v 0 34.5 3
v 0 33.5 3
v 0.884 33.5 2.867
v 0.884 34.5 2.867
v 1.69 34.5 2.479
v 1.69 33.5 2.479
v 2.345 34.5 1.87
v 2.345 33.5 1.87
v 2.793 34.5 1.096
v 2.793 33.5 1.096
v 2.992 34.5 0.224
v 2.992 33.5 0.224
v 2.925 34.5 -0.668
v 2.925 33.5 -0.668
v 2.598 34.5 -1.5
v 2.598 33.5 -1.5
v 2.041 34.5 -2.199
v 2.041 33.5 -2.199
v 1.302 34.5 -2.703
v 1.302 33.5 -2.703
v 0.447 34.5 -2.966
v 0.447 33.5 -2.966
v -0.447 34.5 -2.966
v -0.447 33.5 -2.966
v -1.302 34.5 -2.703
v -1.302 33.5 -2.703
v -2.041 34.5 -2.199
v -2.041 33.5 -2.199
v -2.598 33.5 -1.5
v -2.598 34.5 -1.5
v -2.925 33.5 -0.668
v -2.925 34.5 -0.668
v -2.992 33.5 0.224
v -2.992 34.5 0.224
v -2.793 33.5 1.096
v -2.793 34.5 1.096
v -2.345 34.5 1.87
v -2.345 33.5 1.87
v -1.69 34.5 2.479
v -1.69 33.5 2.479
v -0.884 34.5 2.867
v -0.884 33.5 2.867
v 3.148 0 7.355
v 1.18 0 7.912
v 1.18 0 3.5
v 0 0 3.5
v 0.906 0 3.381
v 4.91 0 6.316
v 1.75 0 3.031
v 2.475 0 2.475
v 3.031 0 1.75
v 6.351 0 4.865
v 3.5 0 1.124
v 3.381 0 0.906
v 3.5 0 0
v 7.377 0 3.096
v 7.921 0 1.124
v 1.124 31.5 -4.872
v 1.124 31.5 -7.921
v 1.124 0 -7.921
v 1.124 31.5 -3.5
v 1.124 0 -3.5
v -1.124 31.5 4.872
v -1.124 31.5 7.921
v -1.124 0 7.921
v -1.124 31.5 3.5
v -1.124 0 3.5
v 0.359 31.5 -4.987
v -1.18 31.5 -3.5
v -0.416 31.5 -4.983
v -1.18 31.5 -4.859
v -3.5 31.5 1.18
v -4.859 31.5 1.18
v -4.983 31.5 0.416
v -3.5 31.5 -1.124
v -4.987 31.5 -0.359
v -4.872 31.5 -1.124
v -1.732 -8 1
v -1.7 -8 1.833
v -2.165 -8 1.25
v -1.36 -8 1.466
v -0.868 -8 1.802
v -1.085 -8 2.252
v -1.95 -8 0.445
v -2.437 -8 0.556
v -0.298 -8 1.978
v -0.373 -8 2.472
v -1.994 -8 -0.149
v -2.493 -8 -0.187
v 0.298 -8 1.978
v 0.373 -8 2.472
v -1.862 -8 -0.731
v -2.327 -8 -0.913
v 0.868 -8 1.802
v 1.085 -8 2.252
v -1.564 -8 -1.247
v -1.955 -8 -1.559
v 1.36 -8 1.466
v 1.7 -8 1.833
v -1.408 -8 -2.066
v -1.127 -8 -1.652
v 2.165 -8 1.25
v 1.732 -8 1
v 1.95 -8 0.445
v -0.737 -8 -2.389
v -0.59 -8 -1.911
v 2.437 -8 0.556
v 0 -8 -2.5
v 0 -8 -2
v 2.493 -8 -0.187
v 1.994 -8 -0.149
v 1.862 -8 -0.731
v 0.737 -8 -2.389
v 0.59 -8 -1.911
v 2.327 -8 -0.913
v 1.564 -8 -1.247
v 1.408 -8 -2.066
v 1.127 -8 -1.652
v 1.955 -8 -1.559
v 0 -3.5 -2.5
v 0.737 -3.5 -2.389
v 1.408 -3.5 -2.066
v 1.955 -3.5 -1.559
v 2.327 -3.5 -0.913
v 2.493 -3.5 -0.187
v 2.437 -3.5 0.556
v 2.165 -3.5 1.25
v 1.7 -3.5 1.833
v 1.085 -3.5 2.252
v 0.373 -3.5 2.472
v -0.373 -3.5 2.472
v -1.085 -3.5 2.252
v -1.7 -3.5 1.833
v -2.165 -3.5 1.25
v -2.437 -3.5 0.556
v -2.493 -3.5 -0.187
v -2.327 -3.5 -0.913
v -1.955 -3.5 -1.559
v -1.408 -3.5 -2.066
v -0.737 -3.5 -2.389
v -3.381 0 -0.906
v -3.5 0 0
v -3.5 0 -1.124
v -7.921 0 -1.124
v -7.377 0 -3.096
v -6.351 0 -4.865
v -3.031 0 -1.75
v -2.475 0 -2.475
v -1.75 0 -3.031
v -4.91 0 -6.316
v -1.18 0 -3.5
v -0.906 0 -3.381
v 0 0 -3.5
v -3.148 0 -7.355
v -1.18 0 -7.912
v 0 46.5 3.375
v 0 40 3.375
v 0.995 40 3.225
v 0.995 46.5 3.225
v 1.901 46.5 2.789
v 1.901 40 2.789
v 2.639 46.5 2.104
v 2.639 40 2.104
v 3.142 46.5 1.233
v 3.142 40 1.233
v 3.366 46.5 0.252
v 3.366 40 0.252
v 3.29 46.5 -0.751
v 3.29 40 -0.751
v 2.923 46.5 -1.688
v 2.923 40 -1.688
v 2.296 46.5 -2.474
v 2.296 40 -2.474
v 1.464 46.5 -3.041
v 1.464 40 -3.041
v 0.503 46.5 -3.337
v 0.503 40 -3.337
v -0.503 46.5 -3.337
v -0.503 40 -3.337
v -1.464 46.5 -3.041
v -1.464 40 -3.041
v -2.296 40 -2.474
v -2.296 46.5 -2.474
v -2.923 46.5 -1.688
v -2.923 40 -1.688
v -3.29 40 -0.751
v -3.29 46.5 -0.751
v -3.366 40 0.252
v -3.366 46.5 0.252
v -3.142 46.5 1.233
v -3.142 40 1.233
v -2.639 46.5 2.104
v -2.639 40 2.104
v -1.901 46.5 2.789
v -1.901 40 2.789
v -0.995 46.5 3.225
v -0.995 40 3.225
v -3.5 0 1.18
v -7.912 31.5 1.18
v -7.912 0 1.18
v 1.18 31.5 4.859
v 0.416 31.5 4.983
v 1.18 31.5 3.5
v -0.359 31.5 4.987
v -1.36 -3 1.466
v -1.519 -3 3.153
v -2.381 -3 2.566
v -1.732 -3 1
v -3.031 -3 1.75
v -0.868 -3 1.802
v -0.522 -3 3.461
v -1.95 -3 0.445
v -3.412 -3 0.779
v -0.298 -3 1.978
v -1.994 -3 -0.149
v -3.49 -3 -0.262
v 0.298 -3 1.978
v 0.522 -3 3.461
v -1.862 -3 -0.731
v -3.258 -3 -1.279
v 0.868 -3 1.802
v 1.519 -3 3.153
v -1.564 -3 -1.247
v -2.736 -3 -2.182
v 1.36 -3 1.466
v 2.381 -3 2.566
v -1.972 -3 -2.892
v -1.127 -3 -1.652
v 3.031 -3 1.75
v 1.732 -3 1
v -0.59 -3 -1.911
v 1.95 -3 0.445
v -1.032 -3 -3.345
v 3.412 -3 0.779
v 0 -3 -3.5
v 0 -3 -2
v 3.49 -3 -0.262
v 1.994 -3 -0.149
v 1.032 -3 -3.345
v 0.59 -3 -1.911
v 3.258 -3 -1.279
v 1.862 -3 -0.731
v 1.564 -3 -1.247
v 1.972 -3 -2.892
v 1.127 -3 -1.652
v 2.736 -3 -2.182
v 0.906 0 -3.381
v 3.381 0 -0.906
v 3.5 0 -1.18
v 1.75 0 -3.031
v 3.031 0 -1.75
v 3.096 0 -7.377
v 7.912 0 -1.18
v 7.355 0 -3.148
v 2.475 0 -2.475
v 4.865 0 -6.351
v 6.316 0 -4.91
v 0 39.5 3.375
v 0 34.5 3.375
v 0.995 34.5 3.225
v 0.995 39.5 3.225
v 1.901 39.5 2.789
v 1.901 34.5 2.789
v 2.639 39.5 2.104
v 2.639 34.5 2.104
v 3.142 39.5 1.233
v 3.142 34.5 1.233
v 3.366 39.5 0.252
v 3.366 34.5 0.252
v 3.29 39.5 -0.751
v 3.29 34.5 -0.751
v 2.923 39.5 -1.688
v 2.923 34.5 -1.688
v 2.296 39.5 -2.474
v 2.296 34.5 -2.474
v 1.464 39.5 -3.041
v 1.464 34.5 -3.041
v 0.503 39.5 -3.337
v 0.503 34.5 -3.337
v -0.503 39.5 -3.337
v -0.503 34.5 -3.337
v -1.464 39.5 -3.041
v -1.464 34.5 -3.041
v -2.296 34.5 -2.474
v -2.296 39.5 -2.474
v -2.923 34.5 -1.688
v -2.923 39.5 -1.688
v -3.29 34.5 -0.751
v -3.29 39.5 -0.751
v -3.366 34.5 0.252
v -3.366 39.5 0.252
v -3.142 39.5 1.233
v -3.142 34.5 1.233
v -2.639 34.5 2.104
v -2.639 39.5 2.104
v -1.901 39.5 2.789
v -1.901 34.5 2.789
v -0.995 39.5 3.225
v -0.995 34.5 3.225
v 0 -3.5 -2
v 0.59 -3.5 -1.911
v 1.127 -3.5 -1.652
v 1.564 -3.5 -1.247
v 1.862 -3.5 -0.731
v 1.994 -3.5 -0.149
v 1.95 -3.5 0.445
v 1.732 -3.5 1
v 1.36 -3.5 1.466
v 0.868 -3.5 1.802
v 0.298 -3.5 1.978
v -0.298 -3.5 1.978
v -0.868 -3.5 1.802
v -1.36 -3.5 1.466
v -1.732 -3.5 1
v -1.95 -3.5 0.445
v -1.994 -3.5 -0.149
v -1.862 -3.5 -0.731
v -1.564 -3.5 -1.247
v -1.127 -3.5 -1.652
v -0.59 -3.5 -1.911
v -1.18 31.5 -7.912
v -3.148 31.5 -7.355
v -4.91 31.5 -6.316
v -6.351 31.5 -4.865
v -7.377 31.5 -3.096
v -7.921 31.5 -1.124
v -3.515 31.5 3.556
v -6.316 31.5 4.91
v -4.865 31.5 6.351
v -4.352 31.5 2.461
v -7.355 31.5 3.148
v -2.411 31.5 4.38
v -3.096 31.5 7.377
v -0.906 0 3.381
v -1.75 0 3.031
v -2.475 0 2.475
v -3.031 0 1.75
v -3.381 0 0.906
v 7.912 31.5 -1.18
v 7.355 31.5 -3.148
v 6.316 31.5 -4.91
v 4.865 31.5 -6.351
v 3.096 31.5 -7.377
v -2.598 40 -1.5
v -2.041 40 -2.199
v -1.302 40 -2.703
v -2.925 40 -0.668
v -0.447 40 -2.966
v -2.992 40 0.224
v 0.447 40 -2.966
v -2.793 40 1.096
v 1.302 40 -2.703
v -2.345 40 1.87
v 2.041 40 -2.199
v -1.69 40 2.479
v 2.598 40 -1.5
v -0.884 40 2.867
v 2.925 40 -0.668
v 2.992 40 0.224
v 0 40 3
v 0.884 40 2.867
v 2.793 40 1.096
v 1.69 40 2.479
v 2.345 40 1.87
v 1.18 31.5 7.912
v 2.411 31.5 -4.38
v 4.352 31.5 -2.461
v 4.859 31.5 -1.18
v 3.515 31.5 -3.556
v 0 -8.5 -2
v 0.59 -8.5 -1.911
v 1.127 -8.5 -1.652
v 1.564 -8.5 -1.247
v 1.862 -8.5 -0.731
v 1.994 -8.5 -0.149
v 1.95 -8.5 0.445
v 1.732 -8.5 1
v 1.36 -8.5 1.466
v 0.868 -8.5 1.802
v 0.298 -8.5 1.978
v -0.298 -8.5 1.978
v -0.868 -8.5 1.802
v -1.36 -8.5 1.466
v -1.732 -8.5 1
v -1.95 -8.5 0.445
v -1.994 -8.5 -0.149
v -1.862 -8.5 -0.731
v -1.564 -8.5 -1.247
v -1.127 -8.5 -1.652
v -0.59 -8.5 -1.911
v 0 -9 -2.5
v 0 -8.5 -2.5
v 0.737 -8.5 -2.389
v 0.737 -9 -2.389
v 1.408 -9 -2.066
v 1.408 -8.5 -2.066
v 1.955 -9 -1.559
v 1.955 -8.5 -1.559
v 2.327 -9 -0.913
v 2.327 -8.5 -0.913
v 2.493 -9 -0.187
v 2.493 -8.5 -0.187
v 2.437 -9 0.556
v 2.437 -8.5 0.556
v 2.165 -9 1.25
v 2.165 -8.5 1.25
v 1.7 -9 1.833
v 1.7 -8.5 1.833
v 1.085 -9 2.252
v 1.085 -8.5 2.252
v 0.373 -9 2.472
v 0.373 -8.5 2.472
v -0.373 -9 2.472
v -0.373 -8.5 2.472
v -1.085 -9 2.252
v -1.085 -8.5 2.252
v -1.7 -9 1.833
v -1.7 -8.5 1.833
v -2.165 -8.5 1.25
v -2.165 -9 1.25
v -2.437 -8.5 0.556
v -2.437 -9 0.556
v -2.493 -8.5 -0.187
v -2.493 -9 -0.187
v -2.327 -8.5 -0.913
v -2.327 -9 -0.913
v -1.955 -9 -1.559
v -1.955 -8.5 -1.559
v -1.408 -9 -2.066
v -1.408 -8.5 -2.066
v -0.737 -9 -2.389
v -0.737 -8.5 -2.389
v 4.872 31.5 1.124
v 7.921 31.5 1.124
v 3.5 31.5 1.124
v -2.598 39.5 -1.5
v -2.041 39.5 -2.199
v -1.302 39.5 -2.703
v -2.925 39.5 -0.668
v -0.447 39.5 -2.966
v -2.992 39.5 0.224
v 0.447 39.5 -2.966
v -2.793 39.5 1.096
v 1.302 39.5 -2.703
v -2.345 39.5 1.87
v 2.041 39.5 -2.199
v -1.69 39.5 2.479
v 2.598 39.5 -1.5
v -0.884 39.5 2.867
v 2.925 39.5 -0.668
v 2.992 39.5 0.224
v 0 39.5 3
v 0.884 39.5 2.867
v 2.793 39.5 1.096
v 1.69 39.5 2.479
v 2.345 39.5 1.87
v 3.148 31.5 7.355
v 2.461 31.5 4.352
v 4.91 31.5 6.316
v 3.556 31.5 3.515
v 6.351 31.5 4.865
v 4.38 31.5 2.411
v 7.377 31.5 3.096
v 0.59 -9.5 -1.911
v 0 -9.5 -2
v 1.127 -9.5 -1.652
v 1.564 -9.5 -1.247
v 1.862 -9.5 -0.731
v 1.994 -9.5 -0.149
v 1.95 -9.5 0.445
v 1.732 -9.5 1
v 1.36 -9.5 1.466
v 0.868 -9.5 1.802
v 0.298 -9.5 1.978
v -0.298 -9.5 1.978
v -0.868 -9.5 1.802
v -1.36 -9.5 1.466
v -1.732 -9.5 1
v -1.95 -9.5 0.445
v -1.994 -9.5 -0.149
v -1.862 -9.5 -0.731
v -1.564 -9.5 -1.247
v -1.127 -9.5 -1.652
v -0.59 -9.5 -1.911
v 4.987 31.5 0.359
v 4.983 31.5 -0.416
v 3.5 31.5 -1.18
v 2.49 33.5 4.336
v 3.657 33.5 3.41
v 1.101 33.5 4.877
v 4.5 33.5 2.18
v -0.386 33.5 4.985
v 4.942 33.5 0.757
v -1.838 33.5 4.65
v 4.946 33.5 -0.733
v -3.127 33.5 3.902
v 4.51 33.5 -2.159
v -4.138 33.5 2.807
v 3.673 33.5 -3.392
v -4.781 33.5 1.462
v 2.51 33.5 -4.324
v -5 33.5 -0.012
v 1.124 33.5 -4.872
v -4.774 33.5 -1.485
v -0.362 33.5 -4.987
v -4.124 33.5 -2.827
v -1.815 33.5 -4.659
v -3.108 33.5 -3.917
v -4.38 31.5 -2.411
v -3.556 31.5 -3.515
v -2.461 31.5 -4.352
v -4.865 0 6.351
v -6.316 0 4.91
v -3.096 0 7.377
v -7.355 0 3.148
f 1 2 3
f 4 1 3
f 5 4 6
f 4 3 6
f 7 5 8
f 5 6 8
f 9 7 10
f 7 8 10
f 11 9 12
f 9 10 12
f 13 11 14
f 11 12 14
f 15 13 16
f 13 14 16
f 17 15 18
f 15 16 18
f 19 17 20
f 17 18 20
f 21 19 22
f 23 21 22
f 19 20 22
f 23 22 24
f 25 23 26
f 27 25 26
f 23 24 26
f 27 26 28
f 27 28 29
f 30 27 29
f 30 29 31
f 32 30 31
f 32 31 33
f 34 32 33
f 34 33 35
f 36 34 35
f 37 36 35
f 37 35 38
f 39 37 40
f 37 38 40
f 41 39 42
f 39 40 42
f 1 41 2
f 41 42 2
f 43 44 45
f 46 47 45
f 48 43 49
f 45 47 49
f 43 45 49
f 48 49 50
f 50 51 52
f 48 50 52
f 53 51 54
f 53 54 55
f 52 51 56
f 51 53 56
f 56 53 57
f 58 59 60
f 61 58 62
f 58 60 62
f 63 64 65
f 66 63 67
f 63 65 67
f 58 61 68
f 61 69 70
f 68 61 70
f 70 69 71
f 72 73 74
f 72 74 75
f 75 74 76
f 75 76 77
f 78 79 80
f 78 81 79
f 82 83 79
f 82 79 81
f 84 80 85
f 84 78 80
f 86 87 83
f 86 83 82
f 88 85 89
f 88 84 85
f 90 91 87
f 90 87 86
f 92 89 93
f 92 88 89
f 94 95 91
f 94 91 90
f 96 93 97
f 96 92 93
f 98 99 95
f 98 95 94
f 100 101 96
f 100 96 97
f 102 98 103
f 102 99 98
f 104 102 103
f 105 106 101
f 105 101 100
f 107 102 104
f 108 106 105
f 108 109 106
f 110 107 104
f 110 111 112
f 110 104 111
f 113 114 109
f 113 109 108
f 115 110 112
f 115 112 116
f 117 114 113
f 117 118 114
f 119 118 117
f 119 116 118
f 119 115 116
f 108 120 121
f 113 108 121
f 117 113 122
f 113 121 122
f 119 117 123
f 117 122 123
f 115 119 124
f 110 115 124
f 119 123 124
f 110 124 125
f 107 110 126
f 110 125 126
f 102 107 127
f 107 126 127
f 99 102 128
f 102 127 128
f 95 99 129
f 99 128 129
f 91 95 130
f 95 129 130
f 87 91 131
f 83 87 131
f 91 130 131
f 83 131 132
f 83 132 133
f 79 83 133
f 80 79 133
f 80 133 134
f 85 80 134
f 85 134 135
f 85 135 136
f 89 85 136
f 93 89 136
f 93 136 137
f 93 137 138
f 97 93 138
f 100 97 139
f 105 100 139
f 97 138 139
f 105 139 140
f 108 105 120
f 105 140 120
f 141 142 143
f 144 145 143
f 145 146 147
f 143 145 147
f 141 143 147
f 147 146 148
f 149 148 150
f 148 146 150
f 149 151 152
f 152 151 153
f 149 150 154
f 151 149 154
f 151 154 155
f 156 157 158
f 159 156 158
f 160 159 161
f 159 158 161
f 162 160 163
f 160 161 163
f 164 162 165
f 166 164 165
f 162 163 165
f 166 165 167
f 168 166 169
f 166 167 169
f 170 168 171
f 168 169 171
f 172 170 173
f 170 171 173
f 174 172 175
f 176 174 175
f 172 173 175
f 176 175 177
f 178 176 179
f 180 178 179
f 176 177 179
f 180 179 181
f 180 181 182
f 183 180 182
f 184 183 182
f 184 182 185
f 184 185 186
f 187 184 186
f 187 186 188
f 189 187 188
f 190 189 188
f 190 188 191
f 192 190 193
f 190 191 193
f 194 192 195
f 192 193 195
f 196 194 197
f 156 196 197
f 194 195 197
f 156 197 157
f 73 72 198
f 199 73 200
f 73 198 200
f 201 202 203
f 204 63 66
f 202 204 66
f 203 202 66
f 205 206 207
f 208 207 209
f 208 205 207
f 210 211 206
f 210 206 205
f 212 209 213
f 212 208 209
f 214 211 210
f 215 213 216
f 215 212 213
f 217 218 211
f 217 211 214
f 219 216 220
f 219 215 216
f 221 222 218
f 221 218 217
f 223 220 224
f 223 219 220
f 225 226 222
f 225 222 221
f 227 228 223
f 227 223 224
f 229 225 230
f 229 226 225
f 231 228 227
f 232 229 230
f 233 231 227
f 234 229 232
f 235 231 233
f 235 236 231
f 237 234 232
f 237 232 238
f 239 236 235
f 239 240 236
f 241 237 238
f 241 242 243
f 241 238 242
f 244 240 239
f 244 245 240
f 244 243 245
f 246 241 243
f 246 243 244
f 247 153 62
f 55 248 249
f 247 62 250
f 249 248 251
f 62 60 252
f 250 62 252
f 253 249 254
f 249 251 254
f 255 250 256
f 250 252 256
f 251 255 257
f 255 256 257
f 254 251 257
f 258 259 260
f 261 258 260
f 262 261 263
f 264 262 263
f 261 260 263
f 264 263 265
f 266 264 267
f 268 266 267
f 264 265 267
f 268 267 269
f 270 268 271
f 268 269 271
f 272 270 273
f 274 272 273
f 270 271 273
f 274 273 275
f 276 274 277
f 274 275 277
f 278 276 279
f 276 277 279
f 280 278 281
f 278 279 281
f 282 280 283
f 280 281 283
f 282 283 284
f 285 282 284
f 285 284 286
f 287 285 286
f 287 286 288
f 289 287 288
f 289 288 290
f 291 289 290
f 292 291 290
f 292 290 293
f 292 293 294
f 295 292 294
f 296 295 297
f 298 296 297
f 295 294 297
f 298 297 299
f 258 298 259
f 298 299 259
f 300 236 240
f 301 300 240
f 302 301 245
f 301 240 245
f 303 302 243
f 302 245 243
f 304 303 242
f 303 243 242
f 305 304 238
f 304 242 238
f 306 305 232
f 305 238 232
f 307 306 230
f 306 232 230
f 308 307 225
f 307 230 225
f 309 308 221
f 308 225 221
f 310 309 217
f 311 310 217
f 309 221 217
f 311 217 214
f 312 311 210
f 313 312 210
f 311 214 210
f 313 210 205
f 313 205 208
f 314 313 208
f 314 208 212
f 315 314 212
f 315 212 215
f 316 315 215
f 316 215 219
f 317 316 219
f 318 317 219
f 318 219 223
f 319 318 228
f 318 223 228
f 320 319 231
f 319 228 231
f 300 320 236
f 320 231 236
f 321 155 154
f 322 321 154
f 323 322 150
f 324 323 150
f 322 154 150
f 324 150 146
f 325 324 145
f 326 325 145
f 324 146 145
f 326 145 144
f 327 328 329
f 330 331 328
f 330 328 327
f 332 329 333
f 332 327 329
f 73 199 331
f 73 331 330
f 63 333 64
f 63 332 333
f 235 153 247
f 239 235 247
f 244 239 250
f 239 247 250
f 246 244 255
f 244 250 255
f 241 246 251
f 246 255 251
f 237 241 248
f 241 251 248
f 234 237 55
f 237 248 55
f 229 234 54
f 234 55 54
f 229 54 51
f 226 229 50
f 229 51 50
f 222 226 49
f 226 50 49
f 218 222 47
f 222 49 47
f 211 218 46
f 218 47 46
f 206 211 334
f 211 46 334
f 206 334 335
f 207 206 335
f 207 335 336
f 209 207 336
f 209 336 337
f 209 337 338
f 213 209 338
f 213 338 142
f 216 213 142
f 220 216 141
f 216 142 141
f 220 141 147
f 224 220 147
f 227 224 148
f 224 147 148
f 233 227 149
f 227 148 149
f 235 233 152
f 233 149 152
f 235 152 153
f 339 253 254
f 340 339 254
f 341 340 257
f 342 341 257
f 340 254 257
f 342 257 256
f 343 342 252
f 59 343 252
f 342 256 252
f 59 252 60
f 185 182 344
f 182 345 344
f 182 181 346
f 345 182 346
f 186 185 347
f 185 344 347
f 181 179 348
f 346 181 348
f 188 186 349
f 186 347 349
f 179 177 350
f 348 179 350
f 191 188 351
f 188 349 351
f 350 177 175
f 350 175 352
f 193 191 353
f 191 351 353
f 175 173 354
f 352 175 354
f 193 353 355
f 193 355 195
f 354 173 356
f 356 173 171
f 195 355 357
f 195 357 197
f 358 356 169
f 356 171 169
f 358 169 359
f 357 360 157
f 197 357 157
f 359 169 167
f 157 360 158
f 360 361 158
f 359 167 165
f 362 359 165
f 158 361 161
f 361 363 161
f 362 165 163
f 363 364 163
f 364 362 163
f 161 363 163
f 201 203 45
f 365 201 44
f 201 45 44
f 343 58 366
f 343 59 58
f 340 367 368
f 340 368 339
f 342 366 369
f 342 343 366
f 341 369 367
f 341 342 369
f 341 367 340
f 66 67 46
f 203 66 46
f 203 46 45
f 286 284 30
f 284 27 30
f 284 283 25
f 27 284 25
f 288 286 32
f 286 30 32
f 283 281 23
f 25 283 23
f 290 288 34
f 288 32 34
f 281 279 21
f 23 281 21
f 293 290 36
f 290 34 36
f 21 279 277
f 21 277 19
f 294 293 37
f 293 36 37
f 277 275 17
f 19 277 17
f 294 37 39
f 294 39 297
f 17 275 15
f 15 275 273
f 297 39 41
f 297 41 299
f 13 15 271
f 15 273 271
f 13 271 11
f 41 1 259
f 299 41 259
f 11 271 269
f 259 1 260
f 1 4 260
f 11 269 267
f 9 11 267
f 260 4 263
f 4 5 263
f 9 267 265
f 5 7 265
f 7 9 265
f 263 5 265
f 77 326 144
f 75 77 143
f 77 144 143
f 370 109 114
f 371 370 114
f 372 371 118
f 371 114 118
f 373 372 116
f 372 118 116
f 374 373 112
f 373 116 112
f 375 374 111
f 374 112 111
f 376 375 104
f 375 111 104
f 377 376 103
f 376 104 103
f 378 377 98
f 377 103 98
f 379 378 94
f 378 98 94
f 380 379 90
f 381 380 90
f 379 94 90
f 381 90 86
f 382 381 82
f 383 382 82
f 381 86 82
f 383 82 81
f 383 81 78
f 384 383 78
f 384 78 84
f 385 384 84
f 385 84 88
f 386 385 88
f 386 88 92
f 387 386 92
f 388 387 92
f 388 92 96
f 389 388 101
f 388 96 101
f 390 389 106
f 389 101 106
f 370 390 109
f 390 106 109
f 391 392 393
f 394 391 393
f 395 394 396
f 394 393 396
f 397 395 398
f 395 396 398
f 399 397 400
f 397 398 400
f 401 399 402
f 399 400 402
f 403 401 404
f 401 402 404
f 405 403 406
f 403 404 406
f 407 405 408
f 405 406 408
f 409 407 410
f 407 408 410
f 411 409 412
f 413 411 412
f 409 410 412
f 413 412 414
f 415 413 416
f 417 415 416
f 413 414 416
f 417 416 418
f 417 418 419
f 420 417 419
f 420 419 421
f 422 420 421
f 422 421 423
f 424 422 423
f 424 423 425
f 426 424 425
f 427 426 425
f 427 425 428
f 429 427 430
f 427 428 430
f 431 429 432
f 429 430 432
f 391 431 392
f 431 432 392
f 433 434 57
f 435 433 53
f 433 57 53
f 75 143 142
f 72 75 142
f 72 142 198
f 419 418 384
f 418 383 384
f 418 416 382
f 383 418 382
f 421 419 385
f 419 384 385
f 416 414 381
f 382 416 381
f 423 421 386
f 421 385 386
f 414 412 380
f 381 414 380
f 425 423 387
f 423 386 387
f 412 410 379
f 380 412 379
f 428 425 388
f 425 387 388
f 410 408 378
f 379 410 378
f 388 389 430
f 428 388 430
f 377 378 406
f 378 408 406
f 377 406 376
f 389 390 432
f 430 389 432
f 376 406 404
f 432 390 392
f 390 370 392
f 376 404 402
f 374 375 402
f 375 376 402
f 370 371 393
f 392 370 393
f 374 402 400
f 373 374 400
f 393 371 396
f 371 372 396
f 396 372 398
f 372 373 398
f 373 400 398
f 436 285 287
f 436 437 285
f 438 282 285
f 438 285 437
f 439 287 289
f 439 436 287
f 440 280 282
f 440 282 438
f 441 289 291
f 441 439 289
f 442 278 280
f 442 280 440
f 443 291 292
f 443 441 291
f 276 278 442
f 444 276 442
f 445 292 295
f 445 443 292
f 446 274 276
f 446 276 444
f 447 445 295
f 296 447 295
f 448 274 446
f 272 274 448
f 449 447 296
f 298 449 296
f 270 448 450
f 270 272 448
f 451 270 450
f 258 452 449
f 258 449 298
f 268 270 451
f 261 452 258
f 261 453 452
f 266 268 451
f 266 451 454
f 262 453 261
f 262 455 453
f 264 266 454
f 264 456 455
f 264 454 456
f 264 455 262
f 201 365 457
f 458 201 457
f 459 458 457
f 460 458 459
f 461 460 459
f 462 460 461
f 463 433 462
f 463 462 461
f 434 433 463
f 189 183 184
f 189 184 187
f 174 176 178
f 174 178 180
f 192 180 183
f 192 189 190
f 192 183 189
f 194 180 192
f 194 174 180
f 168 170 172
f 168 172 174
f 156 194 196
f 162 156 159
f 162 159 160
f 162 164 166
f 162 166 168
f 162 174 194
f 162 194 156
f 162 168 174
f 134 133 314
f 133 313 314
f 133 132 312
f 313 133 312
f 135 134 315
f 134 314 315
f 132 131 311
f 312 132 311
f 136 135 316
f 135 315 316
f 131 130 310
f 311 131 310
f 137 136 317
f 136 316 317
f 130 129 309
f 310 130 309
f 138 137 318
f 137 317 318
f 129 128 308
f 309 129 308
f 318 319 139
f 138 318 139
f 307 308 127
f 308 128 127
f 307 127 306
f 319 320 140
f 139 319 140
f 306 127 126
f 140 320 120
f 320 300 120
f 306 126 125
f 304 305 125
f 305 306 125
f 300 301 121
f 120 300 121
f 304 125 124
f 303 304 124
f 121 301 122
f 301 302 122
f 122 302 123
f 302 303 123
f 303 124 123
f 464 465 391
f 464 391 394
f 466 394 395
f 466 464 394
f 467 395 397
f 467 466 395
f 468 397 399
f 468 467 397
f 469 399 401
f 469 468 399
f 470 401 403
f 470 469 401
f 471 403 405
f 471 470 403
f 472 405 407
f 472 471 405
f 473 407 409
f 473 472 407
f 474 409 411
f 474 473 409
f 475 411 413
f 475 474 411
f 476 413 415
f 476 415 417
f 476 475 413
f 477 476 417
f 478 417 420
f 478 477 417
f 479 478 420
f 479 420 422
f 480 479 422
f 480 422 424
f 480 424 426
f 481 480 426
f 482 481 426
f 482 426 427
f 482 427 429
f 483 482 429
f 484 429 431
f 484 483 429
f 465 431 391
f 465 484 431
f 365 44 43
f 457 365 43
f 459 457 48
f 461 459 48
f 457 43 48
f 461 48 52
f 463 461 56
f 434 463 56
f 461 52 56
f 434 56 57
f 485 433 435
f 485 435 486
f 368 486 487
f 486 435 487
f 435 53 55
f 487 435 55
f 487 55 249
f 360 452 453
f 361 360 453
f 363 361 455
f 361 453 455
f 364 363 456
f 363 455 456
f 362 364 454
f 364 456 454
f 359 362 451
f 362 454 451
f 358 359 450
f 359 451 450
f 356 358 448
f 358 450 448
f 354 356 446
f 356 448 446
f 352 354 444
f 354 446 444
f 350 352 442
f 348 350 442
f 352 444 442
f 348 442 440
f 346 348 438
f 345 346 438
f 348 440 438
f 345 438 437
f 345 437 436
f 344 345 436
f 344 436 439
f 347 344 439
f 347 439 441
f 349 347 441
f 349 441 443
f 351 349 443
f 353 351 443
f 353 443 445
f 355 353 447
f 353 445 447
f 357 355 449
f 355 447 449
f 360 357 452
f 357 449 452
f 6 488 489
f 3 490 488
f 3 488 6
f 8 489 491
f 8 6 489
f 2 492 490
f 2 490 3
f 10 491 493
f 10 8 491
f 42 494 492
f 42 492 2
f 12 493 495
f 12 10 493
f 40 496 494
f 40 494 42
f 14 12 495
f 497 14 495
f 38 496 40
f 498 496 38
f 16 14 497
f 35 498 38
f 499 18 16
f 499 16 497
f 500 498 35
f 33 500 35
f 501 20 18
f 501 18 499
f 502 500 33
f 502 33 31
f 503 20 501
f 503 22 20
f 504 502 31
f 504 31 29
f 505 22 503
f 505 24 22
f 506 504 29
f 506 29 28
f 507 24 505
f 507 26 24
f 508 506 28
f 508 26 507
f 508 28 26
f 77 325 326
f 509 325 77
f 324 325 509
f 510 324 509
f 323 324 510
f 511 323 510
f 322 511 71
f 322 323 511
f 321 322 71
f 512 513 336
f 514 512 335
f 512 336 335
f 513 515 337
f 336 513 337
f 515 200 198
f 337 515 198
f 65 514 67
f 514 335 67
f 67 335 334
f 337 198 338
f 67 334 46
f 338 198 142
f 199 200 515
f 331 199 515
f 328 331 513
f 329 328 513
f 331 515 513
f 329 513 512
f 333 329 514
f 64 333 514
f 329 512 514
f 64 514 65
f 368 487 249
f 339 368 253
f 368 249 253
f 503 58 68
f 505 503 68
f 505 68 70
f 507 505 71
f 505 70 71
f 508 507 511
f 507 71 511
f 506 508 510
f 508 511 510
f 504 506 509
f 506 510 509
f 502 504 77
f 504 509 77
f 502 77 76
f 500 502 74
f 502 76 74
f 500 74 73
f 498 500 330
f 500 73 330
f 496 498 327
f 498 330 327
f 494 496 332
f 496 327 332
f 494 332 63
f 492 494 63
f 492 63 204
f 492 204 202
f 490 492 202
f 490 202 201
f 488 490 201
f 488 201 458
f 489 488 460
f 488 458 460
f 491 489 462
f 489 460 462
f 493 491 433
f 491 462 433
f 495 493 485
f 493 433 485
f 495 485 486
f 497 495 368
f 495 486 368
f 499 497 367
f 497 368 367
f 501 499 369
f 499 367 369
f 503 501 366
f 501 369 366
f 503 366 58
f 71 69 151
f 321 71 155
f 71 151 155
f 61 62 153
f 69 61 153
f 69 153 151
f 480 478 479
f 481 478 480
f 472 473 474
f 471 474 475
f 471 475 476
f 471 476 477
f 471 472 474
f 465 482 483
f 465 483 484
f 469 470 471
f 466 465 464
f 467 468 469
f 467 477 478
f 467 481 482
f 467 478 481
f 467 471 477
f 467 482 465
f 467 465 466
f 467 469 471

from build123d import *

# Parameters (mm, degrees)
BOSS_EXTRU_1_DEPTH  = 31.5
ESQUISSE3_R         = 3.5
BOSS_EXTRU_2_DEPTH  = 3
ESQUISSE5_R         = 2
BOSS_EXTRU_3_DEPTH  = 0.5
ESQUISSE6_R         = 2.5
BOSS_EXTRU_4_DEPTH  = 4.5
ESQUISSE8_R         = 2
BOSS_EXTRU_5_DEPTH  = 0.5
ESQUISSE9_R         = 2.5
BOSS_EXTRU_6_DEPTH  = 1
CHANFREIN1_SIZE     = 0.5
ESQUISSE10_R        = 5
BOSS_EXTRU_7_DEPTH  = 2
ESQUISSE11_R        = 3
BOSS_EXTRU_8_DEPTH  = 1
ESQUISSE13_R        = 3.375
BOSS_EXTRU_9_DEPTH  = 5
ESQUISSE15_R        = 3
BOSS_EXTRU_10_DEPTH = 0.5
ESQUISSE16_R        = 3.375
BOSS_EXTRU_11_DEPTH = 6.5


with BuildPart() as part:
    # Esquisse1 → Boss.-Extru.1 (new body)
    with BuildSketch(Plane(origin=(0, 0, 0), x_dir=(1, 0, 0), z_dir=(0, 1, 0))):
        with BuildLine():
            Line((1.18016373, -3.5), (1.18016373, -7.912472027))
            ThreePointArc((1.18016373, -7.912472027), (5.676756903, -5.636881324), (7.920594452, -1.124359161))
            Line((7.920594452, -1.124359161), (3.5, -1.124359161))
            Line((3.5, -1.124359161), (3.5, 1.18016373))
            Line((3.5, 1.18016373), (7.912472027, 1.18016373))
            ThreePointArc((7.912472027, 1.18016373), (5.636881324, 5.676756903), (1.124359161, 7.920594452))
            Line((1.124359161, 7.920594452), (1.124359161, 3.5))
            Line((1.124359161, 3.5), (-1.18016373, 3.5))
            Line((-1.18016373, 3.5), (-1.18016373, 7.912472027))
            ThreePointArc((-1.18016373, 7.912472027), (-5.676756903, 5.636881324), (-7.920594452, 1.124359161))
            Line((-7.920594452, 1.124359161), (-3.5, 1.124359161))
            Line((-3.5, 1.124359161), (-3.5, -1.18016373))
            Line((-3.5, -1.18016373), (-7.912472027, -1.18016373))
            ThreePointArc((-7.912472027, -1.18016373), (-5.636881324, -5.676756903), (-1.124359161, -7.920594452))
            Line((-1.124359161, -7.920594452), (-1.124359161, -3.5))
            Line((-1.124359161, -3.5), (1.18016373, -3.5))
        make_face()
    extrude(amount=BOSS_EXTRU_1_DEPTH)

    # Esquisse3 → Boss.-Extru.2 (add)
    with BuildSketch(Plane.XZ):
        with Locations(Location((0, 0, 0), (0, 0, 270))):
            Circle(ESQUISSE3_R)
    extrude(amount=BOSS_EXTRU_2_DEPTH)

    # Esquisse5 → Boss.-Extru.3 (add)
    with BuildSketch(Plane.XZ.offset(3)):
        with Locations(Location((0, 0, 0), (0, 0, 270))):
            Circle(ESQUISSE5_R)
    extrude(amount=BOSS_EXTRU_3_DEPTH)

    # Esquisse6 → Boss.-Extru.4 (add)
    with BuildSketch(Plane.XZ.offset(3.5)):
        with Locations(Location((0, 0, 0), (0, 0, 270))):
            Circle(ESQUISSE6_R)
    extrude(amount=BOSS_EXTRU_4_DEPTH)

    # Esquisse8 → Boss.-Extru.5 (add)
    with BuildSketch(Plane.XZ.offset(8)):
        with Locations(Location((0, 0, 0), (0, 0, 270))):
            Circle(ESQUISSE8_R)
    extrude(amount=BOSS_EXTRU_5_DEPTH)

    # Esquisse9 → Boss.-Extru.6 (add)
    with BuildSketch(Plane.XZ.offset(8.5)):
        with Locations(Location((0, 0, 0), (0, 0, 270))):
            Circle(ESQUISSE9_R)
    extrude(amount=BOSS_EXTRU_6_DEPTH)

    # Chanfrein1
    chanfrein1_edges = [part.edges().sort_by_distance(p)[0] for p in [
        (0, -9.5, 2.5),
    ]]
    chamfer(chanfrein1_edges, length=CHANFREIN1_SIZE)

    # Esquisse10 → Boss.-Extru.7 (add)
    with BuildSketch(Plane(origin=(0, 31.5, 0), x_dir=(1, 0, 0), z_dir=(0, 1, 0))):
        with Locations(Location((0, 0, 0), (0, 0, 77.004658444))):
            Circle(ESQUISSE10_R)
    extrude(amount=BOSS_EXTRU_7_DEPTH)

    # Esquisse11 → Boss.-Extru.8 (add)
    with BuildSketch(Plane(origin=(0, 33.5, 0), x_dir=(1, 0, 0), z_dir=(0, 1, 0))):
        with Locations(Location((0, 0, 0), (0, 0, 270))):
            Circle(ESQUISSE11_R)
    extrude(amount=BOSS_EXTRU_8_DEPTH)

    # Esquisse13 → Boss.-Extru.9 (add)
    with BuildSketch(Plane(origin=(0, 34.5, 0), x_dir=(1, 0, 0), z_dir=(0, 1, 0))):
        with Locations(Location((0, 0, 0), (0, 0, 270))):
            Circle(ESQUISSE13_R)
    extrude(amount=BOSS_EXTRU_9_DEPTH)

    # Esquisse15 → Boss.-Extru.10 (add)
    with BuildSketch(Plane(origin=(0, 39.5, 0), x_dir=(1, 0, 0), z_dir=(0, 1, 0))):
        with Locations(Location((0, 0, 0), (0, 0, 270))):
            Circle(ESQUISSE15_R)
    extrude(amount=BOSS_EXTRU_10_DEPTH)

    # Esquisse16 → Boss.-Extru.11 (add)
    with BuildSketch(Plane(origin=(0, 40, 0), x_dir=(1, 0, 0), z_dir=(0, 1, 0))):
        with Locations(Location((0, 0, 0), (0, 0, 270))):
            Circle(ESQUISSE16_R)
    extrude(amount=BOSS_EXTRU_11_DEPTH)


solid = part.part
